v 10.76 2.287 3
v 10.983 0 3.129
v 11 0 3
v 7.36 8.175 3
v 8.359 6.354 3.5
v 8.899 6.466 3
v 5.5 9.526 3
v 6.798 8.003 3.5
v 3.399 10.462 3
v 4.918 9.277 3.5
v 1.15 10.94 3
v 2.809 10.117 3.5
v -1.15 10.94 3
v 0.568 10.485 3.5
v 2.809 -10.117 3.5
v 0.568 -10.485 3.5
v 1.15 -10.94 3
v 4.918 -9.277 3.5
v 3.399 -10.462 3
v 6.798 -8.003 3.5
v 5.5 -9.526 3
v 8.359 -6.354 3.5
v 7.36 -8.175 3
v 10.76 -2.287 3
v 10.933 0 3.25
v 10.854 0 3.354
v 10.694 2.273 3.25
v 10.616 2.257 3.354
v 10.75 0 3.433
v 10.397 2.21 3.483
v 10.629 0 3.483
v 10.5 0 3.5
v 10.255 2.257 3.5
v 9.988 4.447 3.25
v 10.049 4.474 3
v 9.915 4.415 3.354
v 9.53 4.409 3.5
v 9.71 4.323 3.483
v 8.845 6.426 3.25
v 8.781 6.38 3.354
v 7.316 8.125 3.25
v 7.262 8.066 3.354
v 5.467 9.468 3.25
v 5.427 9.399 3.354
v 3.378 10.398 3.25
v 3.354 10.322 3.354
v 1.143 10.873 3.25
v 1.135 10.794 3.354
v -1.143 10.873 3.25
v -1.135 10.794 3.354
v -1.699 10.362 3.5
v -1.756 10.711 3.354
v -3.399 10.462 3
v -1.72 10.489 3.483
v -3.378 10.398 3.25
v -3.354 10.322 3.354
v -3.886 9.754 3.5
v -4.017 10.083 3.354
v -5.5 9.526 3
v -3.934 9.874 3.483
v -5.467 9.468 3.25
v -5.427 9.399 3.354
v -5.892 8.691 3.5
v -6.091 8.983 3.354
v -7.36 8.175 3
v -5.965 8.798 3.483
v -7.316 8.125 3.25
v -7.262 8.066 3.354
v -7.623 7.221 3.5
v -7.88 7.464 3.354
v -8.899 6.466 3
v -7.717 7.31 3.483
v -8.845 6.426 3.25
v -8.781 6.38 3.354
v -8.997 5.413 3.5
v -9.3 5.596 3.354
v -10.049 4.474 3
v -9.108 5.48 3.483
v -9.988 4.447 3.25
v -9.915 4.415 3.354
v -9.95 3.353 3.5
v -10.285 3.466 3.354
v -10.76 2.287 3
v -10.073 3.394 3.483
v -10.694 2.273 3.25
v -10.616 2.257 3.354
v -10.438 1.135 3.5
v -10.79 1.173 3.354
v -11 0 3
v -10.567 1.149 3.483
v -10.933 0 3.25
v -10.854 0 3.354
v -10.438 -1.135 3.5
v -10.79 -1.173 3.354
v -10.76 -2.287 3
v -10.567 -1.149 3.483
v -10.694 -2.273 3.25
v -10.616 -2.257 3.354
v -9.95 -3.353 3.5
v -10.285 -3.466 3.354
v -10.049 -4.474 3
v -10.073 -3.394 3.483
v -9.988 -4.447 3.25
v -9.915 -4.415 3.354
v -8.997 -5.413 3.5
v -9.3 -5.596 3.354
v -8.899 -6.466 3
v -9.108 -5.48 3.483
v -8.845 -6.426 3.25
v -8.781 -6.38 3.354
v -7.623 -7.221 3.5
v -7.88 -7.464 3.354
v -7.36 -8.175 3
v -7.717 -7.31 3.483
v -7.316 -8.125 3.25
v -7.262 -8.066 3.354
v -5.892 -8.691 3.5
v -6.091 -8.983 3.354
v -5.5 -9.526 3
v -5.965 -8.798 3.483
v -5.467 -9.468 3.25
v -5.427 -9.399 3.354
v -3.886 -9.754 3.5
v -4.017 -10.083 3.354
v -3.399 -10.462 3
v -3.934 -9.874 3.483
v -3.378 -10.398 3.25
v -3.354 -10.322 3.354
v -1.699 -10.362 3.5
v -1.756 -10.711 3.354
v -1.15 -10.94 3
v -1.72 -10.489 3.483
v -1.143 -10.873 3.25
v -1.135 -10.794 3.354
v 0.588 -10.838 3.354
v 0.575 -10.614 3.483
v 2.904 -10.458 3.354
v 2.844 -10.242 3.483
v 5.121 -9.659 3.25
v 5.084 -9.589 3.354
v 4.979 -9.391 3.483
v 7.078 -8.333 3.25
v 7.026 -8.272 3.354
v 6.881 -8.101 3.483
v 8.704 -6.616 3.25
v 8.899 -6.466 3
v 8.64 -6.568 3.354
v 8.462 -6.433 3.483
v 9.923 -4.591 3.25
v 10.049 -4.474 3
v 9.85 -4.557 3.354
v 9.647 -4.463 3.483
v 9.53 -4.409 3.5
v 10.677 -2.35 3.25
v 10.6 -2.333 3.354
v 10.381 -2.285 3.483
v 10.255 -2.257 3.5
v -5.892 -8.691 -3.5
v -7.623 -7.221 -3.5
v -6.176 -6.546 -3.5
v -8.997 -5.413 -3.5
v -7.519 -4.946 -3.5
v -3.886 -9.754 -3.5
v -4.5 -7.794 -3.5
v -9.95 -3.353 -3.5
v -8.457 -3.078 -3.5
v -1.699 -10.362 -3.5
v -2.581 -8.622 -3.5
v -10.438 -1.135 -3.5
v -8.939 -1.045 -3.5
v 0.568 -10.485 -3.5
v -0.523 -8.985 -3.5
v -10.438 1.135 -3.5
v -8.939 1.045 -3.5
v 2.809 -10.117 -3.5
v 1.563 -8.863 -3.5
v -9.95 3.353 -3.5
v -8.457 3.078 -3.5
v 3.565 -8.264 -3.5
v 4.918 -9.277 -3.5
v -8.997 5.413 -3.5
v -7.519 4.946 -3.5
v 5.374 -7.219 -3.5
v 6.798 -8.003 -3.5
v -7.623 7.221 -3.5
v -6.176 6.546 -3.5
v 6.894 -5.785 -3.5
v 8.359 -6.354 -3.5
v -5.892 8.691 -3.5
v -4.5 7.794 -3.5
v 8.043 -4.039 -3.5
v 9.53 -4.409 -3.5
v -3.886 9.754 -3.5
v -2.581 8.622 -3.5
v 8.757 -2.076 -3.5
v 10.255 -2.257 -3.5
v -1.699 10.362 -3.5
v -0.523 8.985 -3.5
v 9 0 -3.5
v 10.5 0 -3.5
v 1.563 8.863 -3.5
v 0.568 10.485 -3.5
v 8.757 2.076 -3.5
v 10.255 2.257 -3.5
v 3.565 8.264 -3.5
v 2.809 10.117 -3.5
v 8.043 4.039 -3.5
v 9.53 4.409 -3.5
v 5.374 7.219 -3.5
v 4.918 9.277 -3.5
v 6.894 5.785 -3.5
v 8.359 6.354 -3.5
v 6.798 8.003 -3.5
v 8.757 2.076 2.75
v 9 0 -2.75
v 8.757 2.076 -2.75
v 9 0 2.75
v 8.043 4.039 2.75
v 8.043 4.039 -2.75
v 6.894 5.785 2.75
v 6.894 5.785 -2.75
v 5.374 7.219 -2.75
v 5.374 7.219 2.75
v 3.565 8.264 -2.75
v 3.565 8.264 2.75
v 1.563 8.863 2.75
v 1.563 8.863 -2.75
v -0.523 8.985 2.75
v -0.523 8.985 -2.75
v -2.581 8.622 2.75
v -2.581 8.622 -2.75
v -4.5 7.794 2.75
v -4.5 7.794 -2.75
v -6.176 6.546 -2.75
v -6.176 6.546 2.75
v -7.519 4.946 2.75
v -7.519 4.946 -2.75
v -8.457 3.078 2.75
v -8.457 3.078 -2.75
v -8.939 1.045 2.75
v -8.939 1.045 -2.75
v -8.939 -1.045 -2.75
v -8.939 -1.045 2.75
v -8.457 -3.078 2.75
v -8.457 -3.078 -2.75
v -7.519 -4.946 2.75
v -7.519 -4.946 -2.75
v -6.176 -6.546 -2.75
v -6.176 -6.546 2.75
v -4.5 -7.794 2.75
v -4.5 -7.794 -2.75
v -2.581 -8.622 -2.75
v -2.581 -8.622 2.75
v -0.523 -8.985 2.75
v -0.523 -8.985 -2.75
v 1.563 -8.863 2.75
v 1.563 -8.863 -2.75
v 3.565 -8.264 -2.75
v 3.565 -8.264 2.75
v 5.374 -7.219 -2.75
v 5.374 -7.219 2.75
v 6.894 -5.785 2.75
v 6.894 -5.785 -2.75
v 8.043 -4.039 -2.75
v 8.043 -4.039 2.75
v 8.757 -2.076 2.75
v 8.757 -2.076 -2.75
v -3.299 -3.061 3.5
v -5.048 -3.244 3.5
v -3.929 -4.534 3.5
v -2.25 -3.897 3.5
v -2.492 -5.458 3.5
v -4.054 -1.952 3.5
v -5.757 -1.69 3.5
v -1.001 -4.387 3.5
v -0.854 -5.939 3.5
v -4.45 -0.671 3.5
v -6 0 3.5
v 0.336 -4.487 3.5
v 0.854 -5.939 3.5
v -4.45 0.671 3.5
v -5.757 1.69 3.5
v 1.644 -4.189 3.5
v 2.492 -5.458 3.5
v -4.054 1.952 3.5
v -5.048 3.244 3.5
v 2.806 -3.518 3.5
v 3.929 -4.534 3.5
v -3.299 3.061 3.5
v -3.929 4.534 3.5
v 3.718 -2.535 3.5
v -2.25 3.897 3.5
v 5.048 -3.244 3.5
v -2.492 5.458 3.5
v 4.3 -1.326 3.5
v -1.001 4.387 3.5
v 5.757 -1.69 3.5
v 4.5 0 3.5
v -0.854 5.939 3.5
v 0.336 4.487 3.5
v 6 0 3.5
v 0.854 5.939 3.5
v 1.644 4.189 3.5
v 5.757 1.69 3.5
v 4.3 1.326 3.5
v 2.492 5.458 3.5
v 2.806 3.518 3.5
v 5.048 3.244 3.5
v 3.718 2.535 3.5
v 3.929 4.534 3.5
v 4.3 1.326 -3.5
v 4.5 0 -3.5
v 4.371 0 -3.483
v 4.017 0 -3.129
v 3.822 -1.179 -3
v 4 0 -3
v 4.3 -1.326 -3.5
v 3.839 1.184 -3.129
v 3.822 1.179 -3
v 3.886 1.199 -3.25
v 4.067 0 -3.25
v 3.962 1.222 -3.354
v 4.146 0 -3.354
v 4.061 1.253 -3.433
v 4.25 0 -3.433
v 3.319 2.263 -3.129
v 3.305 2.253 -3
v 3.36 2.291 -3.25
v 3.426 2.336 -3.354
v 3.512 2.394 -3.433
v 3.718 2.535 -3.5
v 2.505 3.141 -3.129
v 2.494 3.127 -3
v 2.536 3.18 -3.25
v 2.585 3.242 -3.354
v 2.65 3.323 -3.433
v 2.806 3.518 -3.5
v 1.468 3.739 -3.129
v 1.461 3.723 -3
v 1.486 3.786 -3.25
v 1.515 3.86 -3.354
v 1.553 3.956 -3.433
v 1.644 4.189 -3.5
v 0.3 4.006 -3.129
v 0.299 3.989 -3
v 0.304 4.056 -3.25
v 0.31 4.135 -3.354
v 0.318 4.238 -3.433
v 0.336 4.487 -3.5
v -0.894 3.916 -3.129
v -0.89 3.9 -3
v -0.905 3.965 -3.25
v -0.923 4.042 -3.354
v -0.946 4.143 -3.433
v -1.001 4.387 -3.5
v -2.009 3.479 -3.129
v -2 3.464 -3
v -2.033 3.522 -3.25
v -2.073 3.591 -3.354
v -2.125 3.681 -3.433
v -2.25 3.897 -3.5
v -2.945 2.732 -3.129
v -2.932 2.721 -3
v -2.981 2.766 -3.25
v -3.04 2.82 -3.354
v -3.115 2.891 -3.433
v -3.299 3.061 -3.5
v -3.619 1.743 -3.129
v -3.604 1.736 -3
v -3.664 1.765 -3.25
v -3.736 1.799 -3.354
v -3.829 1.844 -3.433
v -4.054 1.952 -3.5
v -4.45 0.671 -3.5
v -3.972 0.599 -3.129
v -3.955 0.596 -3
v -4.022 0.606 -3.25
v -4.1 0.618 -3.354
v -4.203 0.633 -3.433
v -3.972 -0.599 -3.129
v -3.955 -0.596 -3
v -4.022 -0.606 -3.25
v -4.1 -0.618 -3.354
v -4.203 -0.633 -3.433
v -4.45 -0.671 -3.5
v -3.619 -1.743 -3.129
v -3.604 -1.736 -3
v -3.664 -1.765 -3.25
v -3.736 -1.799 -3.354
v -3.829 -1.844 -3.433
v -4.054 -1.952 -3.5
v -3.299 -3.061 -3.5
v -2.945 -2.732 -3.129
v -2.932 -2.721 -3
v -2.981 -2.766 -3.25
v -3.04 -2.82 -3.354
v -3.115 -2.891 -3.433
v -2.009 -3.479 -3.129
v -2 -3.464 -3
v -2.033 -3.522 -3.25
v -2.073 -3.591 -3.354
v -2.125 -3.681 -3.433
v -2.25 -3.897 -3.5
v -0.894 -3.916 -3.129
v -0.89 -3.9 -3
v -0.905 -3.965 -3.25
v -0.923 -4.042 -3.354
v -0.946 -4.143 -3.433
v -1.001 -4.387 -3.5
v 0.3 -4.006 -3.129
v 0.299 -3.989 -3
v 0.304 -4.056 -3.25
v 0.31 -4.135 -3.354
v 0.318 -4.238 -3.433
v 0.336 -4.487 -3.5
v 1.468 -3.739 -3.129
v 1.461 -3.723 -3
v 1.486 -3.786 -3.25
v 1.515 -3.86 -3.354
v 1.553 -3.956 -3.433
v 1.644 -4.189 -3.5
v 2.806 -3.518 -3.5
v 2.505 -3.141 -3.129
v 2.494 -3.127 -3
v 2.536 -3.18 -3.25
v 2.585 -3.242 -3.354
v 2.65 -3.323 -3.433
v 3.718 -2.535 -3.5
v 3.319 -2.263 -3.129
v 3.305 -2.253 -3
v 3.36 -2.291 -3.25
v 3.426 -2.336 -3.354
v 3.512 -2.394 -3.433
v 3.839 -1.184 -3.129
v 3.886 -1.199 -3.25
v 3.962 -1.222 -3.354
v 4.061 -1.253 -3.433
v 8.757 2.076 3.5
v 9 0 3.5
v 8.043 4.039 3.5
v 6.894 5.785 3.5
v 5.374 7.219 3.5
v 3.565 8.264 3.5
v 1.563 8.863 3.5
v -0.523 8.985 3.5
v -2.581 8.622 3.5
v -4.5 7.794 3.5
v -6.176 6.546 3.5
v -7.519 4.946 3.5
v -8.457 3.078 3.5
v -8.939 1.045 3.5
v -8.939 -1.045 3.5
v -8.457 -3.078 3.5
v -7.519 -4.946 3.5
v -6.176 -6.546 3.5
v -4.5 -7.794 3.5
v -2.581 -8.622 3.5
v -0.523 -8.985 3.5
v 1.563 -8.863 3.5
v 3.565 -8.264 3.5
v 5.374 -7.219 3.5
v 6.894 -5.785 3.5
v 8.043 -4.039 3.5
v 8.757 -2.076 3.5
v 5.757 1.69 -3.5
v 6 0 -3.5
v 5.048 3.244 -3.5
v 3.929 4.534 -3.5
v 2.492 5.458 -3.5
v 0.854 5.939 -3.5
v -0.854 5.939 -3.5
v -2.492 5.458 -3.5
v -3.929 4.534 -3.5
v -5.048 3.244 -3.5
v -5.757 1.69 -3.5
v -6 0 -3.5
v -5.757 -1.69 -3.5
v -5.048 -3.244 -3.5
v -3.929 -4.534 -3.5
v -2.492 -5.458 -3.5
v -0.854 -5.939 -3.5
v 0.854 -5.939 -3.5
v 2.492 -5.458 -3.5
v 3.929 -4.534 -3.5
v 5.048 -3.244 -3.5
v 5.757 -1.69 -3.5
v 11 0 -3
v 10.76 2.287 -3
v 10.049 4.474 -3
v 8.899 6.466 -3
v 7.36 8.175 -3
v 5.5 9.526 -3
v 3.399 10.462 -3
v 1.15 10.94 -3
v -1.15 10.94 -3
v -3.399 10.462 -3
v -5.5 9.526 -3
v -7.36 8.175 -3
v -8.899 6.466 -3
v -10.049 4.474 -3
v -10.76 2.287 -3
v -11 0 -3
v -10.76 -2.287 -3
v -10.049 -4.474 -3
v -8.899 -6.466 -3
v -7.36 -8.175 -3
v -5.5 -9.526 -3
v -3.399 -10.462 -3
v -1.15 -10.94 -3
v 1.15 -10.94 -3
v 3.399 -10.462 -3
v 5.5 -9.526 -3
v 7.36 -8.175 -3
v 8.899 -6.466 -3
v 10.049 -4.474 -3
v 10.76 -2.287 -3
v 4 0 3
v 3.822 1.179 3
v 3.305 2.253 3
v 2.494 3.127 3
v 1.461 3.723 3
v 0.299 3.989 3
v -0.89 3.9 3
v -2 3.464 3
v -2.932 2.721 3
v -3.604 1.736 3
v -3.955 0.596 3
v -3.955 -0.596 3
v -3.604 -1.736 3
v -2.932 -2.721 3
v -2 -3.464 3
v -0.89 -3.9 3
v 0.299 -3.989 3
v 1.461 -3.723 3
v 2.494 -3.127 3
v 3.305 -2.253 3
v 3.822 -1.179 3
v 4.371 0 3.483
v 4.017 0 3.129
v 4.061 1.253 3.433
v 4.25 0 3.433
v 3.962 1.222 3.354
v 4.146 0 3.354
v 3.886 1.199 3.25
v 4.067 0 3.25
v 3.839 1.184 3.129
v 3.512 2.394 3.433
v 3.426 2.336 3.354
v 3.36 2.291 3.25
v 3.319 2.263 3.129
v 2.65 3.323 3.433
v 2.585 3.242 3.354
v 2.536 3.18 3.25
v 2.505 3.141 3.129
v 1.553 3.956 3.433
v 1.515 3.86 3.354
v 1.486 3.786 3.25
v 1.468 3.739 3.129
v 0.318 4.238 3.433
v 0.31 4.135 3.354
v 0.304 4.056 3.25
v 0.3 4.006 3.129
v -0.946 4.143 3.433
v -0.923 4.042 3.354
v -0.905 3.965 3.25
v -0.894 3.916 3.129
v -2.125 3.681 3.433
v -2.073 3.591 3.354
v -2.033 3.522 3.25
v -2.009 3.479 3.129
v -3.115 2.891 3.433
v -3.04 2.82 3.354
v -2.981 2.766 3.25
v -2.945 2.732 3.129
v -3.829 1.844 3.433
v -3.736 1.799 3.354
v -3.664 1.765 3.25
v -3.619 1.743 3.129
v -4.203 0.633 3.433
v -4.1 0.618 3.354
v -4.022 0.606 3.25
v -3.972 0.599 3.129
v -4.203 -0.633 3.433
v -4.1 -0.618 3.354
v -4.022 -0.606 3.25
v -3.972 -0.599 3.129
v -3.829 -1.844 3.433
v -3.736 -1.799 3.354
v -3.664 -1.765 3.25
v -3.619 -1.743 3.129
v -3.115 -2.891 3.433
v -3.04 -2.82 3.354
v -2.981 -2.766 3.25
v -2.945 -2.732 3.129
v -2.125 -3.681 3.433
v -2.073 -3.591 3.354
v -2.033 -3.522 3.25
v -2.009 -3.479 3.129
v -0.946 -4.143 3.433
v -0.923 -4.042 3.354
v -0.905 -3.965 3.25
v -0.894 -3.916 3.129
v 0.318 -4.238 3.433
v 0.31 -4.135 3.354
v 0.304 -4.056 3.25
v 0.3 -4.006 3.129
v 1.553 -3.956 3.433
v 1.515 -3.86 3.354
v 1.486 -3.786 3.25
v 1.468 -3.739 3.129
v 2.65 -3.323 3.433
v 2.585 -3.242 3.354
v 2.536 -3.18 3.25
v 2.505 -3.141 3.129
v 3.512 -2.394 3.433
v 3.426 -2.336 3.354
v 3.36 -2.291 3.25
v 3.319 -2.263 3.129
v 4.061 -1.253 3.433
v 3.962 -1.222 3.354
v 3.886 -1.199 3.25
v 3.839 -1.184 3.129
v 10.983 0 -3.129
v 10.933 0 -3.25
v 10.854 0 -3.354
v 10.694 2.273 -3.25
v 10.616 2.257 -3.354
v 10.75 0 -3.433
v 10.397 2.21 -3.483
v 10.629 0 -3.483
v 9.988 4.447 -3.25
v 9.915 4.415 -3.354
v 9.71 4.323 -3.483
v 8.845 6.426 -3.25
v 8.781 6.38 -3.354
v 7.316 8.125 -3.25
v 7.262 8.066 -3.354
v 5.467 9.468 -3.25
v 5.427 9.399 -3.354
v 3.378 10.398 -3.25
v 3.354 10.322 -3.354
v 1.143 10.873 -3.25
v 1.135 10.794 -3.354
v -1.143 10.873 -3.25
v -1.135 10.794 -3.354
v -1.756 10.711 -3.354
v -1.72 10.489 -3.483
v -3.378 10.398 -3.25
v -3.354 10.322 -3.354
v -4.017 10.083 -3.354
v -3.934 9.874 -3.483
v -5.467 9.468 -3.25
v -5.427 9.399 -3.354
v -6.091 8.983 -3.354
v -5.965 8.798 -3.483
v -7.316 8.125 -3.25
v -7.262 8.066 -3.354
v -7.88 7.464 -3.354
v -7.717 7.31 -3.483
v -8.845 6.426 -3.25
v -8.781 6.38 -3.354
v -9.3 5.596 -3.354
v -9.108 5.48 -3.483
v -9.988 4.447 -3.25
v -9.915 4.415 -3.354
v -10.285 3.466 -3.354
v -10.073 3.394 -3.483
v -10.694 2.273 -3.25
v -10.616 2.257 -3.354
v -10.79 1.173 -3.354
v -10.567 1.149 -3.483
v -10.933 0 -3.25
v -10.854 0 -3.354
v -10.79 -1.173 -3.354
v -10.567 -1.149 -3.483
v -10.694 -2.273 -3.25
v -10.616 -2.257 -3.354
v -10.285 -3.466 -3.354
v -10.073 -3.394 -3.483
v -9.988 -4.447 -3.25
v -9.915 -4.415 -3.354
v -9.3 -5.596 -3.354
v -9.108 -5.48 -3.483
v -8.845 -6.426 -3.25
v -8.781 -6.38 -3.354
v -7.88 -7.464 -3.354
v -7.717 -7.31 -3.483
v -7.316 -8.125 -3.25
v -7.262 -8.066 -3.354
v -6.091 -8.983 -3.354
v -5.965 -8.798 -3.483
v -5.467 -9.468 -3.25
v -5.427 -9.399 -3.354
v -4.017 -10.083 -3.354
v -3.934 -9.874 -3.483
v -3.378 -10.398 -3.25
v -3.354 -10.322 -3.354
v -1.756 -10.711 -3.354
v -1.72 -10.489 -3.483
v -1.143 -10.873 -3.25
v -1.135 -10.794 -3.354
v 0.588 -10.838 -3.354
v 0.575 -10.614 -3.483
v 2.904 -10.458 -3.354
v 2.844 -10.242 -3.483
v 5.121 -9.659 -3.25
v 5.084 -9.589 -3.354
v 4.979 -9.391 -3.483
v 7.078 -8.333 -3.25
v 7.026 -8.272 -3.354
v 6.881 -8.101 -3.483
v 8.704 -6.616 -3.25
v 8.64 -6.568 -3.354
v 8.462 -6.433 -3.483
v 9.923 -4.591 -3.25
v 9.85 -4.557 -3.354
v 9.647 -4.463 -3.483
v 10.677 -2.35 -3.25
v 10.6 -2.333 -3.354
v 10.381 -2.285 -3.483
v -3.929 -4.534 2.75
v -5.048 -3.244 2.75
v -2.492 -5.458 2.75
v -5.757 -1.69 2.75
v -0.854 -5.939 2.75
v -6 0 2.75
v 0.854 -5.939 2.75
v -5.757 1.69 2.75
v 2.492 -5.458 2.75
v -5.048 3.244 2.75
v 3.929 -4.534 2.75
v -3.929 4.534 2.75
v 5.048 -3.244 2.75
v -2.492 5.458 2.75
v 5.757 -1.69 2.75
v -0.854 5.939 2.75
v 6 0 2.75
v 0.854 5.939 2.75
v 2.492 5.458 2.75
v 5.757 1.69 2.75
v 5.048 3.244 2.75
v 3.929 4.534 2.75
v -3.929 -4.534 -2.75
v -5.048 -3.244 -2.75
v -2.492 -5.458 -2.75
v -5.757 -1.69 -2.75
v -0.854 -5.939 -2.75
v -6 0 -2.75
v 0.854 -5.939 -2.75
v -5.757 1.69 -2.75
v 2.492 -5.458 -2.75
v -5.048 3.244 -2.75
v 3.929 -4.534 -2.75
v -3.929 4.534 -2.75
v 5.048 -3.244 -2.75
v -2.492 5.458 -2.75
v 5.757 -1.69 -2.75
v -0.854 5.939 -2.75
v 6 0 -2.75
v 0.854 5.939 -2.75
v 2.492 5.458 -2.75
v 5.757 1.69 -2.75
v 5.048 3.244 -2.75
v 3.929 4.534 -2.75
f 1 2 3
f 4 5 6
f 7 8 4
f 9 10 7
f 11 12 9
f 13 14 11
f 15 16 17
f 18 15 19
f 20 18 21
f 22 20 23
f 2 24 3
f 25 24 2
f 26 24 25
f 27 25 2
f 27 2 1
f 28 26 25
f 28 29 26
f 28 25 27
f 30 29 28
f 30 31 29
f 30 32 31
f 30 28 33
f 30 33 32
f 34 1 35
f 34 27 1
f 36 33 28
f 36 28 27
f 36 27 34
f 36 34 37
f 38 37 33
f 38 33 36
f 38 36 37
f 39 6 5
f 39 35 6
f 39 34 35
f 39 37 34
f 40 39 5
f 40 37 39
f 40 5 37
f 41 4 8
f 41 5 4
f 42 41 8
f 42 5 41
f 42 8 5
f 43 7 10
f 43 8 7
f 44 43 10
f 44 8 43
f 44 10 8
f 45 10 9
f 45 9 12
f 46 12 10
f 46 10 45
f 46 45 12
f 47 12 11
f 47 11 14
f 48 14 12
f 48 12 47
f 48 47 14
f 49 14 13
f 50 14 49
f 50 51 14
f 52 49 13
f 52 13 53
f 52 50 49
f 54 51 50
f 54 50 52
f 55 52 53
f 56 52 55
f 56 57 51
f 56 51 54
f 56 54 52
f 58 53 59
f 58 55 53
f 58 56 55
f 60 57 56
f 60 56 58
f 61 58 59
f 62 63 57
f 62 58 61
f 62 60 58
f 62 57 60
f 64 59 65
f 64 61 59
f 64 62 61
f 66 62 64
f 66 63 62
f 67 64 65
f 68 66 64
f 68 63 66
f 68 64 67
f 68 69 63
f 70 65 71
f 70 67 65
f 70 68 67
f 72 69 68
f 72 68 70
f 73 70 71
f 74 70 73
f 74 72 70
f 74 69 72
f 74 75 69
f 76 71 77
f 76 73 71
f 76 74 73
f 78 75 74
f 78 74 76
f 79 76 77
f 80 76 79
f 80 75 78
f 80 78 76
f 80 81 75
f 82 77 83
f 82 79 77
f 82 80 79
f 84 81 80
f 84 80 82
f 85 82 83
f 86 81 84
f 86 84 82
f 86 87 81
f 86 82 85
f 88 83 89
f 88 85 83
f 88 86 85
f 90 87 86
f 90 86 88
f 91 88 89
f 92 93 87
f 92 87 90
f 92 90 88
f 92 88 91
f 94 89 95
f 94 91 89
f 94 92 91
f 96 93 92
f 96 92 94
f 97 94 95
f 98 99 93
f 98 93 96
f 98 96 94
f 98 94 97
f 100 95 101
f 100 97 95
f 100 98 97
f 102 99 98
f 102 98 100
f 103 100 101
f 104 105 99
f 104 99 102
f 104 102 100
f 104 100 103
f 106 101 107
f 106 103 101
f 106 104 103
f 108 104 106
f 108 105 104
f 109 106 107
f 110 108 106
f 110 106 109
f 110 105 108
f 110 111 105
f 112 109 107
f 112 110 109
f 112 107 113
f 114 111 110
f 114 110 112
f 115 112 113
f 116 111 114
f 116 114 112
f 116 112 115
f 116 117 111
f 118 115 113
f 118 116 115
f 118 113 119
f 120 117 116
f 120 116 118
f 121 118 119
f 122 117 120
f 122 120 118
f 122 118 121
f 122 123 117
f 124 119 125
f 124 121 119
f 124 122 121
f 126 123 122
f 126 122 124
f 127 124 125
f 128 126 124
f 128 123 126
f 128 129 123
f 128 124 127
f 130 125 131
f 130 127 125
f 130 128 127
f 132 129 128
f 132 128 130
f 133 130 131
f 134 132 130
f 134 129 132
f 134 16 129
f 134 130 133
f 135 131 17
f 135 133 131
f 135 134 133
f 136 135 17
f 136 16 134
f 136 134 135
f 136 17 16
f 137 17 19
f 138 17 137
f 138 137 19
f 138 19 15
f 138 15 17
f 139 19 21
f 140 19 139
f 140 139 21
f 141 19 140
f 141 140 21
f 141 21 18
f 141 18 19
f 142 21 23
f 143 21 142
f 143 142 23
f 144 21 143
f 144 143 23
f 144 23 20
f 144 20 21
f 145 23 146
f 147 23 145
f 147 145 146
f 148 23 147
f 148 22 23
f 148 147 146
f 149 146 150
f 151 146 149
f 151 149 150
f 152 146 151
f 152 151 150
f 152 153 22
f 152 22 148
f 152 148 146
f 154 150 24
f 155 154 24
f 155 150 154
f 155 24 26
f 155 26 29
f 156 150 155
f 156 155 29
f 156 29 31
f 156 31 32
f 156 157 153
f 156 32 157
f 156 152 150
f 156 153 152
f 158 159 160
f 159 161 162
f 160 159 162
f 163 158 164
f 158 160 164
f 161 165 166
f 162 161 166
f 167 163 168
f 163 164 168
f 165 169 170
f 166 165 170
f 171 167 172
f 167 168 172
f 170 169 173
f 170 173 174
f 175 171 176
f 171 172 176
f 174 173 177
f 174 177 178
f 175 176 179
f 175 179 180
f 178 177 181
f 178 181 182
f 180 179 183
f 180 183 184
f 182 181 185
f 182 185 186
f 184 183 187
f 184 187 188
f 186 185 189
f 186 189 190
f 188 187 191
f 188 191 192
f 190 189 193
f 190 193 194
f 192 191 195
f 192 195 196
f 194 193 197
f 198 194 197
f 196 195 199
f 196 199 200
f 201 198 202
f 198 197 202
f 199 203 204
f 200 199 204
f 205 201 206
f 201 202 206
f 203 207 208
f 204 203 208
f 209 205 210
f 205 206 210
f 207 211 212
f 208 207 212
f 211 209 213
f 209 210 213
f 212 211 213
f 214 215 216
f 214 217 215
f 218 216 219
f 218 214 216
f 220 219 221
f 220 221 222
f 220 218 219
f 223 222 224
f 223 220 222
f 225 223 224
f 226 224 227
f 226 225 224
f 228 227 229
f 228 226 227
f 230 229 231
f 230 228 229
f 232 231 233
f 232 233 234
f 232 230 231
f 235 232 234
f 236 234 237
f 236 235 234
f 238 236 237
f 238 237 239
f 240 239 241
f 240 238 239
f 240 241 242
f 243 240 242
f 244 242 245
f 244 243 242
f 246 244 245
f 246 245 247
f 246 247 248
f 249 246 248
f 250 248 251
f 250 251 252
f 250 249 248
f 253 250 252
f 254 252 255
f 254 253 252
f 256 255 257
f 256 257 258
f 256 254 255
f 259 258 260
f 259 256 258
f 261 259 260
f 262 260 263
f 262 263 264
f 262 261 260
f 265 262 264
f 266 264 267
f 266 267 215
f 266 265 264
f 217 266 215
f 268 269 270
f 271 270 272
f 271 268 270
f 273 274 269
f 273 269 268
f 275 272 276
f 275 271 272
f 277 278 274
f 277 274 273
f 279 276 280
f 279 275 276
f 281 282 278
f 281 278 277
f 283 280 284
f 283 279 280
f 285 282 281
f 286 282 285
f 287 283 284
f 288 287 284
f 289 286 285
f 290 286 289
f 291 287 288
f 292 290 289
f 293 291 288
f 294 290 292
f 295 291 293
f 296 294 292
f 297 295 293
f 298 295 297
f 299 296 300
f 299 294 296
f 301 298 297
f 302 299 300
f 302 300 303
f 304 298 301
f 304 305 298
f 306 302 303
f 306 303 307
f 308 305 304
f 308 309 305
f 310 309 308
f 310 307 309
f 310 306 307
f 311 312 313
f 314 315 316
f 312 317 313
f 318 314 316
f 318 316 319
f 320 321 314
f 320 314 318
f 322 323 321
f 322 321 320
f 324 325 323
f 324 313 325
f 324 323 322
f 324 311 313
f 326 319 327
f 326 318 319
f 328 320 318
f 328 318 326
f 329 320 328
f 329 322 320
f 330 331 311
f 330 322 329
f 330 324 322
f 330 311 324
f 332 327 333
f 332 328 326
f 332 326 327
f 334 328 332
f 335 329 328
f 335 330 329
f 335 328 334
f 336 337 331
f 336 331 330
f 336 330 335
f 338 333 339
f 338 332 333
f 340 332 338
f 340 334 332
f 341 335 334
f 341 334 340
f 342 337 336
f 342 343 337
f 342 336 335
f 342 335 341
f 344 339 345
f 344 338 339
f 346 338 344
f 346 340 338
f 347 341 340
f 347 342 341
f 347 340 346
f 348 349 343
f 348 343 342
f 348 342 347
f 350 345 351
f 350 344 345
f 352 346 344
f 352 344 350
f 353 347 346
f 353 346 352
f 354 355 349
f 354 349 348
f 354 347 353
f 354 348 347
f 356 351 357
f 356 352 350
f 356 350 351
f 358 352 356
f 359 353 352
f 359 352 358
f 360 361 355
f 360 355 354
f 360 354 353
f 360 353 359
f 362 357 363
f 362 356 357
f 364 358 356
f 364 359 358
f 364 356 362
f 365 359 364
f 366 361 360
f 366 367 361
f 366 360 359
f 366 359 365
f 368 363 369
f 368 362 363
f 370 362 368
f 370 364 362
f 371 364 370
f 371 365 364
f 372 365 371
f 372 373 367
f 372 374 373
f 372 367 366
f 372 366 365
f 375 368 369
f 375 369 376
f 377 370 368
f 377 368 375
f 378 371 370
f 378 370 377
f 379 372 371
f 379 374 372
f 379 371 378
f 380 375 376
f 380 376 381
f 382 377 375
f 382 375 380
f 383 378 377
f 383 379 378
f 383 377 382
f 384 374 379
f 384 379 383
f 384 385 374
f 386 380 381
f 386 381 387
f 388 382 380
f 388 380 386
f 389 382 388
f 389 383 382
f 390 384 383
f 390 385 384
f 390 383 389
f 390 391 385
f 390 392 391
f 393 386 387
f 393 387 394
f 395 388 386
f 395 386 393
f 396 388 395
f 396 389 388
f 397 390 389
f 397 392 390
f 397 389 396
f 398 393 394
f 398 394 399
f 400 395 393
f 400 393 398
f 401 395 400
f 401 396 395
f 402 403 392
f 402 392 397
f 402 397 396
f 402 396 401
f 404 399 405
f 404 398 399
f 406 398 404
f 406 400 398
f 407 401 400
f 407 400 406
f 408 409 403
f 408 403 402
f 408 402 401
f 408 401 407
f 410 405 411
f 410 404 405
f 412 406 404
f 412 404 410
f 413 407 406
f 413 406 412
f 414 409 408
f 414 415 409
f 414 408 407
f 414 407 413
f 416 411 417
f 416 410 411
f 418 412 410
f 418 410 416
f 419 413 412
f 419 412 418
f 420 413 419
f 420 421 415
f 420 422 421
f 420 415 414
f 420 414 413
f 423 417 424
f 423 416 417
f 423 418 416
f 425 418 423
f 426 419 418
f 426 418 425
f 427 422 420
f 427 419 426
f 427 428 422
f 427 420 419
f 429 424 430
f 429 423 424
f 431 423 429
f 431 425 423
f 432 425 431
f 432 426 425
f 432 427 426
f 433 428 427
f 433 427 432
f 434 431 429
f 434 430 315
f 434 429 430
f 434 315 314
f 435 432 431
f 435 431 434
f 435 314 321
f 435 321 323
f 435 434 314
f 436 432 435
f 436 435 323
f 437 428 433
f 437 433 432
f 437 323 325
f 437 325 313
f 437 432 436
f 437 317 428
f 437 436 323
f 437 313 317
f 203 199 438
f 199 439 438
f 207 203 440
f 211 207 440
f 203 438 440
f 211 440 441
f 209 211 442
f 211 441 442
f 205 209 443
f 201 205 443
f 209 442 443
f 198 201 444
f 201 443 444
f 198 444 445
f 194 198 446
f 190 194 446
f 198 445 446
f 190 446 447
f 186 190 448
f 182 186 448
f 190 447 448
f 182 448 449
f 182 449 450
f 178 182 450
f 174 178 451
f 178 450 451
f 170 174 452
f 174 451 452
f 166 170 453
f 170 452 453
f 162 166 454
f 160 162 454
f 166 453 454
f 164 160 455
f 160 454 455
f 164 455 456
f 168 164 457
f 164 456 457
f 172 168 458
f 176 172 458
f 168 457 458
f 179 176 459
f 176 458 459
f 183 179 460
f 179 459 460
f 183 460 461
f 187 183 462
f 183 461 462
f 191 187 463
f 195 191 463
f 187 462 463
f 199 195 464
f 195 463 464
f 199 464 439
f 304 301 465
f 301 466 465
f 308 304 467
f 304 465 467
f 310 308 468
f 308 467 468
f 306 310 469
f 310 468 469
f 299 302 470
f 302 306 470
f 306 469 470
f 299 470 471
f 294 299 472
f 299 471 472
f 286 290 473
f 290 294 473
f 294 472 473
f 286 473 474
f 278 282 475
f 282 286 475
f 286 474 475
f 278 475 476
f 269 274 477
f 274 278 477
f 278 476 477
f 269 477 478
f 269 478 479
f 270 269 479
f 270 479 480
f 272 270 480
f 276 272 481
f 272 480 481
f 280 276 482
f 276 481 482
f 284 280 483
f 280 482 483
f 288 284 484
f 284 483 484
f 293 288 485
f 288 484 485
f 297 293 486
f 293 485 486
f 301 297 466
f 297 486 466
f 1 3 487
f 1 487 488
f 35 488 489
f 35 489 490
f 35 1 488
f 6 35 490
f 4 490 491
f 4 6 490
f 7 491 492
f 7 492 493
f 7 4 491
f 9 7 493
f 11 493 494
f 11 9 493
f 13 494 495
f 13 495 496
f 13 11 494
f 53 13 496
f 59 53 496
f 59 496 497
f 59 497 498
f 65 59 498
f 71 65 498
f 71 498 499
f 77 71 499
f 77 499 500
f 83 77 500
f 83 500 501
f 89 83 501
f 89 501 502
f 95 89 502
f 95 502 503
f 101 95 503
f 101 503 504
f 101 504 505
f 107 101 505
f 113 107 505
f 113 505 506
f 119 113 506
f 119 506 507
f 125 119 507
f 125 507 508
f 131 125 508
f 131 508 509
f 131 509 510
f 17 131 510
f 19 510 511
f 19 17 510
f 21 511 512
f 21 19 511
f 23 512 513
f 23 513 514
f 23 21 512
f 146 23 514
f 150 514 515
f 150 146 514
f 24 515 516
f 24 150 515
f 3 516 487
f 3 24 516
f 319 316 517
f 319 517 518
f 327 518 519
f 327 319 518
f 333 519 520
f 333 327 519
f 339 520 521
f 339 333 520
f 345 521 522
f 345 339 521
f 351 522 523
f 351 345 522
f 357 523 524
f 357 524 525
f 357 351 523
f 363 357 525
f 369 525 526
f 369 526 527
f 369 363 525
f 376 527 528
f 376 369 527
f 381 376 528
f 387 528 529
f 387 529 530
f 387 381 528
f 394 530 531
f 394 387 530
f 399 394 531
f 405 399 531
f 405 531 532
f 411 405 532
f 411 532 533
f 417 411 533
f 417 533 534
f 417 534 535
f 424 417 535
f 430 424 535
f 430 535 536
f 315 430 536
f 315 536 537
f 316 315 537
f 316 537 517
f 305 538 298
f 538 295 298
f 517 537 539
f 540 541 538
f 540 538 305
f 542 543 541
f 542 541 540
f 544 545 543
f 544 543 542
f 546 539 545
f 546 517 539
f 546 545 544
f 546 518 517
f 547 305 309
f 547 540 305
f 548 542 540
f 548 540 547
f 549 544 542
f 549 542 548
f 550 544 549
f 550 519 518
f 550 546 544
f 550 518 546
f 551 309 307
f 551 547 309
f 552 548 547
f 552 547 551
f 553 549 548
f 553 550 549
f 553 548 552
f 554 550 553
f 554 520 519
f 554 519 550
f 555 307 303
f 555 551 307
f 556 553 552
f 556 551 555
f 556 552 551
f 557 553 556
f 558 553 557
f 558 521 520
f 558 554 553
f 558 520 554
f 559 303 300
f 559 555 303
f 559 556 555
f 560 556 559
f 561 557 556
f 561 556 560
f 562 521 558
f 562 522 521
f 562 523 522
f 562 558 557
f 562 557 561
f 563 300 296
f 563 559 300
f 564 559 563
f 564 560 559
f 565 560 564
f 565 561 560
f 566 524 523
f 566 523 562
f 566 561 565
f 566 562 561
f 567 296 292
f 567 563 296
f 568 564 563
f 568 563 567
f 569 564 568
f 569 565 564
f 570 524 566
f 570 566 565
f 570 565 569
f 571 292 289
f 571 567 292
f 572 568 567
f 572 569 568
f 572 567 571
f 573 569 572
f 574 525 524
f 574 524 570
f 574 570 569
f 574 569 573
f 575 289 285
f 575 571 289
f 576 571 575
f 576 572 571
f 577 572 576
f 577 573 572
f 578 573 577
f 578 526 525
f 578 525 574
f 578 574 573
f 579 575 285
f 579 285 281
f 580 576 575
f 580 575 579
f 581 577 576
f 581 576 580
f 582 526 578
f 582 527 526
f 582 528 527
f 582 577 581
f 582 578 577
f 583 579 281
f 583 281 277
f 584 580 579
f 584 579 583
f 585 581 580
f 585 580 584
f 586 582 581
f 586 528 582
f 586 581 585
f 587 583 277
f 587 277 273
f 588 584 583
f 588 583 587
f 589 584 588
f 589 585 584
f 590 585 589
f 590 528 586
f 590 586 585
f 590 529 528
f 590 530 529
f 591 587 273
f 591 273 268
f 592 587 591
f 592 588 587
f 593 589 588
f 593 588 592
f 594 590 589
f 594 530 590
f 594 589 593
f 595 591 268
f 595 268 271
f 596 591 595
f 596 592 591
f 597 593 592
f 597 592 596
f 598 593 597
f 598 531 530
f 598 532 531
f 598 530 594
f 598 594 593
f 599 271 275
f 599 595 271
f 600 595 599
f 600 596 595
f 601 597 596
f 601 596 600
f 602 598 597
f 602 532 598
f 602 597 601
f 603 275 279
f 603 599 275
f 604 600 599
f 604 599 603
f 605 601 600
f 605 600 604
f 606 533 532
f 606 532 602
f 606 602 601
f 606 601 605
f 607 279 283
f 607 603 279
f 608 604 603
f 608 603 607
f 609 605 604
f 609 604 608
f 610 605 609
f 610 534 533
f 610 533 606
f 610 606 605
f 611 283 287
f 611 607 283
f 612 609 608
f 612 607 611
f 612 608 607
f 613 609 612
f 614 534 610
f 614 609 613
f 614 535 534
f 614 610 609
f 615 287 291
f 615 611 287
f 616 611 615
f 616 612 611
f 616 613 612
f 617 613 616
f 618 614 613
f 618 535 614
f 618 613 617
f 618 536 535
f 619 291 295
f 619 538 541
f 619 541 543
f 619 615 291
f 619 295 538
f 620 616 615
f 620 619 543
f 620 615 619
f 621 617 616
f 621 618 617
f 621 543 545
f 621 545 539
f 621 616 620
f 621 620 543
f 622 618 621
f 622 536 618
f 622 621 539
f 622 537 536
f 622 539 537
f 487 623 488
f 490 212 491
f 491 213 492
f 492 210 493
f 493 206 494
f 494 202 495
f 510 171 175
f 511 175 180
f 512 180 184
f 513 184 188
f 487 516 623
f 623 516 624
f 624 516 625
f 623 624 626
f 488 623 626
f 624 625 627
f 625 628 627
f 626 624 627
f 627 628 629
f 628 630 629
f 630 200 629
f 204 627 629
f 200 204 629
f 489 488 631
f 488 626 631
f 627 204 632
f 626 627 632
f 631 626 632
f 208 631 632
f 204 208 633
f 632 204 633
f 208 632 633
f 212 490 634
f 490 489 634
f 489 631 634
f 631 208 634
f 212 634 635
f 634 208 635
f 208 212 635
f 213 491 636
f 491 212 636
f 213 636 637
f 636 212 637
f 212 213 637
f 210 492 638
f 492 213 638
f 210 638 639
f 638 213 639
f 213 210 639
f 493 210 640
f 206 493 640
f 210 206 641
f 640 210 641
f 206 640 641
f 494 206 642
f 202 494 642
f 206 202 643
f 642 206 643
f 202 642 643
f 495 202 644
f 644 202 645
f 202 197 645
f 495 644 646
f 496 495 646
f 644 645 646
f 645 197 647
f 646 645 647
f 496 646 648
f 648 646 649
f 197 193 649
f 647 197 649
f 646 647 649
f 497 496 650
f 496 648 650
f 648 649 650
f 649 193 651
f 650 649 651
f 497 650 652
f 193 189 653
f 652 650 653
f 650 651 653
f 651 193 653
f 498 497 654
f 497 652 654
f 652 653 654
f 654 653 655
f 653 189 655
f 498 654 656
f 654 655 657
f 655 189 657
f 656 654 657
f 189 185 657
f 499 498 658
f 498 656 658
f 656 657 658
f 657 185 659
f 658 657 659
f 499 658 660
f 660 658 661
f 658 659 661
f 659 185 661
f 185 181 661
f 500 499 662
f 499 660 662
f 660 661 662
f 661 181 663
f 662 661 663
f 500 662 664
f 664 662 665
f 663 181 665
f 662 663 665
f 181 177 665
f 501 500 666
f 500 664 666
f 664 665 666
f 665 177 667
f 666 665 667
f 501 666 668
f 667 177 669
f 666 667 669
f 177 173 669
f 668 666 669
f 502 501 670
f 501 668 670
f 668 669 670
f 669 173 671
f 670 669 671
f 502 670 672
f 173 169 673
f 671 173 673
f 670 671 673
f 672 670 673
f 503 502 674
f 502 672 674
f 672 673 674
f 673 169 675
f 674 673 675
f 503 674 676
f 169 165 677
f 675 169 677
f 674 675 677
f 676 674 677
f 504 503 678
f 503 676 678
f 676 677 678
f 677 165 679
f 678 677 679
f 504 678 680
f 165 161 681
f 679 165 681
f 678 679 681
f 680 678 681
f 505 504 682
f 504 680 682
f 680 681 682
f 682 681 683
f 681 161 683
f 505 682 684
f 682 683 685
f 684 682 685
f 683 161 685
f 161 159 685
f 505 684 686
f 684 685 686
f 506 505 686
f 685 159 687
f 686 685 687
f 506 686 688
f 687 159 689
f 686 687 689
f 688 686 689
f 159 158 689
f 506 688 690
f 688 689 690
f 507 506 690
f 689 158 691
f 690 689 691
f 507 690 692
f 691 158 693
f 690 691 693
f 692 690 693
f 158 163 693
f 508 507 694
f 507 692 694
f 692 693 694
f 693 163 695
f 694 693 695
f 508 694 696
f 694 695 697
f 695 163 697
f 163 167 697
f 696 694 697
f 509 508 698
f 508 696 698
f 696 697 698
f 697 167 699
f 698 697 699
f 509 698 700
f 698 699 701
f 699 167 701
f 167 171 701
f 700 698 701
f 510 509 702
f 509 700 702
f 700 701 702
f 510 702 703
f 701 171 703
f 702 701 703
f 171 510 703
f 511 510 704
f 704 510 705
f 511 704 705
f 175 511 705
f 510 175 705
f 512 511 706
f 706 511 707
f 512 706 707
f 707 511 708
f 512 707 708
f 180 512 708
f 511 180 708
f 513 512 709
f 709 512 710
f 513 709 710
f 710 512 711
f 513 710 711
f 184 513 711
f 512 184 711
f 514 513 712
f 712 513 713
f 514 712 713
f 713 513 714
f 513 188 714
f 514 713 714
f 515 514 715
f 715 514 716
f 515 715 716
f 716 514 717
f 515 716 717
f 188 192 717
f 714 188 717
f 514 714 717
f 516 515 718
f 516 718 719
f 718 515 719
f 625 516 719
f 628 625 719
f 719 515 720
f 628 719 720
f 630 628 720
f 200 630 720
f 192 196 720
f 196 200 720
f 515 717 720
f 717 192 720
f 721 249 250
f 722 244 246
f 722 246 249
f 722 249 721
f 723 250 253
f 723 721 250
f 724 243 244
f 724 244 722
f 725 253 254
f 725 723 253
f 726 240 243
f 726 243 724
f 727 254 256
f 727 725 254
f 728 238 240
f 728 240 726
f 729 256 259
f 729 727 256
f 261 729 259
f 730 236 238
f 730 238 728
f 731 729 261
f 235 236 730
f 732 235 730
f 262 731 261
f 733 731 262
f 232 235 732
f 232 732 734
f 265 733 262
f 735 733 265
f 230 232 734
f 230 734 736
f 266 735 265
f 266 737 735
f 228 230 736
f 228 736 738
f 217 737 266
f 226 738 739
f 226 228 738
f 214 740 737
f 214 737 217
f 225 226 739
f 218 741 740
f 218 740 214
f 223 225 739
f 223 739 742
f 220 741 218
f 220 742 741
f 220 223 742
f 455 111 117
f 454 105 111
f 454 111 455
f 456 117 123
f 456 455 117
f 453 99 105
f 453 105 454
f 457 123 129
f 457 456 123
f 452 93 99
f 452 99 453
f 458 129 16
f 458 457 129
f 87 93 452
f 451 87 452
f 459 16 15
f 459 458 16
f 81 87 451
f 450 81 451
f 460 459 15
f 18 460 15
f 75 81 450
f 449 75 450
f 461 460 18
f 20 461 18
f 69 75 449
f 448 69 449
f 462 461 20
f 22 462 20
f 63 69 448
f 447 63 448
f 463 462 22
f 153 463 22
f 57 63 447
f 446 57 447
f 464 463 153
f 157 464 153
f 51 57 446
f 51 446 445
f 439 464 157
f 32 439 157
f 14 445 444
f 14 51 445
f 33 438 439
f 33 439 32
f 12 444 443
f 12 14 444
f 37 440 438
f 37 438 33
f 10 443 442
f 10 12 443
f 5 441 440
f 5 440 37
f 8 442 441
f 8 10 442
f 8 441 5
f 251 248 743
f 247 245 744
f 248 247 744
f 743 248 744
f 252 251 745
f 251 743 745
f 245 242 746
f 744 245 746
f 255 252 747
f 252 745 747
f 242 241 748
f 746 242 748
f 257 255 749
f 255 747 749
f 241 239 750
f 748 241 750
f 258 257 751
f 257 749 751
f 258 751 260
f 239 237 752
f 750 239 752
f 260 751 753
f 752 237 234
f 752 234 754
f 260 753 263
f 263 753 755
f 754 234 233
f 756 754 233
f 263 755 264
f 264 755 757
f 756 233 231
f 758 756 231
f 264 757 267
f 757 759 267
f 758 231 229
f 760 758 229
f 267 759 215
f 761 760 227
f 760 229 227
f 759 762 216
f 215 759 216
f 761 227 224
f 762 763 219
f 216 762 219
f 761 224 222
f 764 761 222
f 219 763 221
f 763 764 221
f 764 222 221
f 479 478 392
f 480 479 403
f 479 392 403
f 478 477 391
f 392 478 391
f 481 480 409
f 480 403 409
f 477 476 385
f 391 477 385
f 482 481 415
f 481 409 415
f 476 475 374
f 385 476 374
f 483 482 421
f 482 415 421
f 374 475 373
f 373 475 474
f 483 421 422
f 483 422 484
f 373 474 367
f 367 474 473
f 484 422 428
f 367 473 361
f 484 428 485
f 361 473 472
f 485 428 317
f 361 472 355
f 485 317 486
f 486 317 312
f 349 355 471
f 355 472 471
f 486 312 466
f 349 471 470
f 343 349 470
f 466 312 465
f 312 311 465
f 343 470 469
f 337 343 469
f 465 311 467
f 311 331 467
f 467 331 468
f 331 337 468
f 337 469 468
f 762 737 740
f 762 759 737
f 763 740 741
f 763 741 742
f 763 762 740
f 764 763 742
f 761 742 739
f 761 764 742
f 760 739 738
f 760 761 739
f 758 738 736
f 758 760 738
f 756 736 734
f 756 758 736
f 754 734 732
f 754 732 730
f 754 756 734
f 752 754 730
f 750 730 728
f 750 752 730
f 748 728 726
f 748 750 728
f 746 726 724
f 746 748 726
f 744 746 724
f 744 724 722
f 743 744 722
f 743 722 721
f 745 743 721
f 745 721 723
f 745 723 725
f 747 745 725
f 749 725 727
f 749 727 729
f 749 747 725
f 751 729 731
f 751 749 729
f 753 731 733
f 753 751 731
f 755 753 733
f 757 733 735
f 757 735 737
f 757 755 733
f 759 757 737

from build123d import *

# Parameters (mm, degrees)
F0_R     = 11
F0_R_2   = 4
F1_DEPTH = 3.5
F2_R     = 0.5
F3_R     = 9
F3_R_2   = 6
F4_DEPTH = 5.75
F5_R     = 9
F5_R_2   = 6
F6_DEPTH = 2.75


with BuildPart() as f1:
    # F0 (on Top) → F1 (new body, symmetric)
    with BuildSketch(Plane.XY):
        Circle(F0_R)
        Circle(F0_R_2, mode=Mode.SUBTRACT)
    extrude(amount=F1_DEPTH, both=True)

    # F2
    f2_edges = [f1.edges().sort_by_distance(p)[0] for p in [
        (-11, 0, 3.5),
        (-11, 0, -3.5),
        (-4, 0, 3.5),
        (-4, 0, -3.5),
    ]]
    fillet(f2_edges, radius=F2_R)

    # F3 (on Top) → F4 (cut, symmetric)
    with BuildSketch(Plane.XY):
        Circle(F3_R)
        Circle(F3_R_2, mode=Mode.SUBTRACT)
    extrude(amount=F4_DEPTH, both=True, mode=Mode.SUBTRACT)


with BuildPart() as f6:
    # F5 (on Top) → F6 (new body, symmetric)
    with BuildSketch(Plane.XY):
        Circle(F5_R)
        Circle(F5_R_2, mode=Mode.SUBTRACT)
    extrude(amount=F6_DEPTH, both=True)


solid = Compound([f1.part, f6.part])
